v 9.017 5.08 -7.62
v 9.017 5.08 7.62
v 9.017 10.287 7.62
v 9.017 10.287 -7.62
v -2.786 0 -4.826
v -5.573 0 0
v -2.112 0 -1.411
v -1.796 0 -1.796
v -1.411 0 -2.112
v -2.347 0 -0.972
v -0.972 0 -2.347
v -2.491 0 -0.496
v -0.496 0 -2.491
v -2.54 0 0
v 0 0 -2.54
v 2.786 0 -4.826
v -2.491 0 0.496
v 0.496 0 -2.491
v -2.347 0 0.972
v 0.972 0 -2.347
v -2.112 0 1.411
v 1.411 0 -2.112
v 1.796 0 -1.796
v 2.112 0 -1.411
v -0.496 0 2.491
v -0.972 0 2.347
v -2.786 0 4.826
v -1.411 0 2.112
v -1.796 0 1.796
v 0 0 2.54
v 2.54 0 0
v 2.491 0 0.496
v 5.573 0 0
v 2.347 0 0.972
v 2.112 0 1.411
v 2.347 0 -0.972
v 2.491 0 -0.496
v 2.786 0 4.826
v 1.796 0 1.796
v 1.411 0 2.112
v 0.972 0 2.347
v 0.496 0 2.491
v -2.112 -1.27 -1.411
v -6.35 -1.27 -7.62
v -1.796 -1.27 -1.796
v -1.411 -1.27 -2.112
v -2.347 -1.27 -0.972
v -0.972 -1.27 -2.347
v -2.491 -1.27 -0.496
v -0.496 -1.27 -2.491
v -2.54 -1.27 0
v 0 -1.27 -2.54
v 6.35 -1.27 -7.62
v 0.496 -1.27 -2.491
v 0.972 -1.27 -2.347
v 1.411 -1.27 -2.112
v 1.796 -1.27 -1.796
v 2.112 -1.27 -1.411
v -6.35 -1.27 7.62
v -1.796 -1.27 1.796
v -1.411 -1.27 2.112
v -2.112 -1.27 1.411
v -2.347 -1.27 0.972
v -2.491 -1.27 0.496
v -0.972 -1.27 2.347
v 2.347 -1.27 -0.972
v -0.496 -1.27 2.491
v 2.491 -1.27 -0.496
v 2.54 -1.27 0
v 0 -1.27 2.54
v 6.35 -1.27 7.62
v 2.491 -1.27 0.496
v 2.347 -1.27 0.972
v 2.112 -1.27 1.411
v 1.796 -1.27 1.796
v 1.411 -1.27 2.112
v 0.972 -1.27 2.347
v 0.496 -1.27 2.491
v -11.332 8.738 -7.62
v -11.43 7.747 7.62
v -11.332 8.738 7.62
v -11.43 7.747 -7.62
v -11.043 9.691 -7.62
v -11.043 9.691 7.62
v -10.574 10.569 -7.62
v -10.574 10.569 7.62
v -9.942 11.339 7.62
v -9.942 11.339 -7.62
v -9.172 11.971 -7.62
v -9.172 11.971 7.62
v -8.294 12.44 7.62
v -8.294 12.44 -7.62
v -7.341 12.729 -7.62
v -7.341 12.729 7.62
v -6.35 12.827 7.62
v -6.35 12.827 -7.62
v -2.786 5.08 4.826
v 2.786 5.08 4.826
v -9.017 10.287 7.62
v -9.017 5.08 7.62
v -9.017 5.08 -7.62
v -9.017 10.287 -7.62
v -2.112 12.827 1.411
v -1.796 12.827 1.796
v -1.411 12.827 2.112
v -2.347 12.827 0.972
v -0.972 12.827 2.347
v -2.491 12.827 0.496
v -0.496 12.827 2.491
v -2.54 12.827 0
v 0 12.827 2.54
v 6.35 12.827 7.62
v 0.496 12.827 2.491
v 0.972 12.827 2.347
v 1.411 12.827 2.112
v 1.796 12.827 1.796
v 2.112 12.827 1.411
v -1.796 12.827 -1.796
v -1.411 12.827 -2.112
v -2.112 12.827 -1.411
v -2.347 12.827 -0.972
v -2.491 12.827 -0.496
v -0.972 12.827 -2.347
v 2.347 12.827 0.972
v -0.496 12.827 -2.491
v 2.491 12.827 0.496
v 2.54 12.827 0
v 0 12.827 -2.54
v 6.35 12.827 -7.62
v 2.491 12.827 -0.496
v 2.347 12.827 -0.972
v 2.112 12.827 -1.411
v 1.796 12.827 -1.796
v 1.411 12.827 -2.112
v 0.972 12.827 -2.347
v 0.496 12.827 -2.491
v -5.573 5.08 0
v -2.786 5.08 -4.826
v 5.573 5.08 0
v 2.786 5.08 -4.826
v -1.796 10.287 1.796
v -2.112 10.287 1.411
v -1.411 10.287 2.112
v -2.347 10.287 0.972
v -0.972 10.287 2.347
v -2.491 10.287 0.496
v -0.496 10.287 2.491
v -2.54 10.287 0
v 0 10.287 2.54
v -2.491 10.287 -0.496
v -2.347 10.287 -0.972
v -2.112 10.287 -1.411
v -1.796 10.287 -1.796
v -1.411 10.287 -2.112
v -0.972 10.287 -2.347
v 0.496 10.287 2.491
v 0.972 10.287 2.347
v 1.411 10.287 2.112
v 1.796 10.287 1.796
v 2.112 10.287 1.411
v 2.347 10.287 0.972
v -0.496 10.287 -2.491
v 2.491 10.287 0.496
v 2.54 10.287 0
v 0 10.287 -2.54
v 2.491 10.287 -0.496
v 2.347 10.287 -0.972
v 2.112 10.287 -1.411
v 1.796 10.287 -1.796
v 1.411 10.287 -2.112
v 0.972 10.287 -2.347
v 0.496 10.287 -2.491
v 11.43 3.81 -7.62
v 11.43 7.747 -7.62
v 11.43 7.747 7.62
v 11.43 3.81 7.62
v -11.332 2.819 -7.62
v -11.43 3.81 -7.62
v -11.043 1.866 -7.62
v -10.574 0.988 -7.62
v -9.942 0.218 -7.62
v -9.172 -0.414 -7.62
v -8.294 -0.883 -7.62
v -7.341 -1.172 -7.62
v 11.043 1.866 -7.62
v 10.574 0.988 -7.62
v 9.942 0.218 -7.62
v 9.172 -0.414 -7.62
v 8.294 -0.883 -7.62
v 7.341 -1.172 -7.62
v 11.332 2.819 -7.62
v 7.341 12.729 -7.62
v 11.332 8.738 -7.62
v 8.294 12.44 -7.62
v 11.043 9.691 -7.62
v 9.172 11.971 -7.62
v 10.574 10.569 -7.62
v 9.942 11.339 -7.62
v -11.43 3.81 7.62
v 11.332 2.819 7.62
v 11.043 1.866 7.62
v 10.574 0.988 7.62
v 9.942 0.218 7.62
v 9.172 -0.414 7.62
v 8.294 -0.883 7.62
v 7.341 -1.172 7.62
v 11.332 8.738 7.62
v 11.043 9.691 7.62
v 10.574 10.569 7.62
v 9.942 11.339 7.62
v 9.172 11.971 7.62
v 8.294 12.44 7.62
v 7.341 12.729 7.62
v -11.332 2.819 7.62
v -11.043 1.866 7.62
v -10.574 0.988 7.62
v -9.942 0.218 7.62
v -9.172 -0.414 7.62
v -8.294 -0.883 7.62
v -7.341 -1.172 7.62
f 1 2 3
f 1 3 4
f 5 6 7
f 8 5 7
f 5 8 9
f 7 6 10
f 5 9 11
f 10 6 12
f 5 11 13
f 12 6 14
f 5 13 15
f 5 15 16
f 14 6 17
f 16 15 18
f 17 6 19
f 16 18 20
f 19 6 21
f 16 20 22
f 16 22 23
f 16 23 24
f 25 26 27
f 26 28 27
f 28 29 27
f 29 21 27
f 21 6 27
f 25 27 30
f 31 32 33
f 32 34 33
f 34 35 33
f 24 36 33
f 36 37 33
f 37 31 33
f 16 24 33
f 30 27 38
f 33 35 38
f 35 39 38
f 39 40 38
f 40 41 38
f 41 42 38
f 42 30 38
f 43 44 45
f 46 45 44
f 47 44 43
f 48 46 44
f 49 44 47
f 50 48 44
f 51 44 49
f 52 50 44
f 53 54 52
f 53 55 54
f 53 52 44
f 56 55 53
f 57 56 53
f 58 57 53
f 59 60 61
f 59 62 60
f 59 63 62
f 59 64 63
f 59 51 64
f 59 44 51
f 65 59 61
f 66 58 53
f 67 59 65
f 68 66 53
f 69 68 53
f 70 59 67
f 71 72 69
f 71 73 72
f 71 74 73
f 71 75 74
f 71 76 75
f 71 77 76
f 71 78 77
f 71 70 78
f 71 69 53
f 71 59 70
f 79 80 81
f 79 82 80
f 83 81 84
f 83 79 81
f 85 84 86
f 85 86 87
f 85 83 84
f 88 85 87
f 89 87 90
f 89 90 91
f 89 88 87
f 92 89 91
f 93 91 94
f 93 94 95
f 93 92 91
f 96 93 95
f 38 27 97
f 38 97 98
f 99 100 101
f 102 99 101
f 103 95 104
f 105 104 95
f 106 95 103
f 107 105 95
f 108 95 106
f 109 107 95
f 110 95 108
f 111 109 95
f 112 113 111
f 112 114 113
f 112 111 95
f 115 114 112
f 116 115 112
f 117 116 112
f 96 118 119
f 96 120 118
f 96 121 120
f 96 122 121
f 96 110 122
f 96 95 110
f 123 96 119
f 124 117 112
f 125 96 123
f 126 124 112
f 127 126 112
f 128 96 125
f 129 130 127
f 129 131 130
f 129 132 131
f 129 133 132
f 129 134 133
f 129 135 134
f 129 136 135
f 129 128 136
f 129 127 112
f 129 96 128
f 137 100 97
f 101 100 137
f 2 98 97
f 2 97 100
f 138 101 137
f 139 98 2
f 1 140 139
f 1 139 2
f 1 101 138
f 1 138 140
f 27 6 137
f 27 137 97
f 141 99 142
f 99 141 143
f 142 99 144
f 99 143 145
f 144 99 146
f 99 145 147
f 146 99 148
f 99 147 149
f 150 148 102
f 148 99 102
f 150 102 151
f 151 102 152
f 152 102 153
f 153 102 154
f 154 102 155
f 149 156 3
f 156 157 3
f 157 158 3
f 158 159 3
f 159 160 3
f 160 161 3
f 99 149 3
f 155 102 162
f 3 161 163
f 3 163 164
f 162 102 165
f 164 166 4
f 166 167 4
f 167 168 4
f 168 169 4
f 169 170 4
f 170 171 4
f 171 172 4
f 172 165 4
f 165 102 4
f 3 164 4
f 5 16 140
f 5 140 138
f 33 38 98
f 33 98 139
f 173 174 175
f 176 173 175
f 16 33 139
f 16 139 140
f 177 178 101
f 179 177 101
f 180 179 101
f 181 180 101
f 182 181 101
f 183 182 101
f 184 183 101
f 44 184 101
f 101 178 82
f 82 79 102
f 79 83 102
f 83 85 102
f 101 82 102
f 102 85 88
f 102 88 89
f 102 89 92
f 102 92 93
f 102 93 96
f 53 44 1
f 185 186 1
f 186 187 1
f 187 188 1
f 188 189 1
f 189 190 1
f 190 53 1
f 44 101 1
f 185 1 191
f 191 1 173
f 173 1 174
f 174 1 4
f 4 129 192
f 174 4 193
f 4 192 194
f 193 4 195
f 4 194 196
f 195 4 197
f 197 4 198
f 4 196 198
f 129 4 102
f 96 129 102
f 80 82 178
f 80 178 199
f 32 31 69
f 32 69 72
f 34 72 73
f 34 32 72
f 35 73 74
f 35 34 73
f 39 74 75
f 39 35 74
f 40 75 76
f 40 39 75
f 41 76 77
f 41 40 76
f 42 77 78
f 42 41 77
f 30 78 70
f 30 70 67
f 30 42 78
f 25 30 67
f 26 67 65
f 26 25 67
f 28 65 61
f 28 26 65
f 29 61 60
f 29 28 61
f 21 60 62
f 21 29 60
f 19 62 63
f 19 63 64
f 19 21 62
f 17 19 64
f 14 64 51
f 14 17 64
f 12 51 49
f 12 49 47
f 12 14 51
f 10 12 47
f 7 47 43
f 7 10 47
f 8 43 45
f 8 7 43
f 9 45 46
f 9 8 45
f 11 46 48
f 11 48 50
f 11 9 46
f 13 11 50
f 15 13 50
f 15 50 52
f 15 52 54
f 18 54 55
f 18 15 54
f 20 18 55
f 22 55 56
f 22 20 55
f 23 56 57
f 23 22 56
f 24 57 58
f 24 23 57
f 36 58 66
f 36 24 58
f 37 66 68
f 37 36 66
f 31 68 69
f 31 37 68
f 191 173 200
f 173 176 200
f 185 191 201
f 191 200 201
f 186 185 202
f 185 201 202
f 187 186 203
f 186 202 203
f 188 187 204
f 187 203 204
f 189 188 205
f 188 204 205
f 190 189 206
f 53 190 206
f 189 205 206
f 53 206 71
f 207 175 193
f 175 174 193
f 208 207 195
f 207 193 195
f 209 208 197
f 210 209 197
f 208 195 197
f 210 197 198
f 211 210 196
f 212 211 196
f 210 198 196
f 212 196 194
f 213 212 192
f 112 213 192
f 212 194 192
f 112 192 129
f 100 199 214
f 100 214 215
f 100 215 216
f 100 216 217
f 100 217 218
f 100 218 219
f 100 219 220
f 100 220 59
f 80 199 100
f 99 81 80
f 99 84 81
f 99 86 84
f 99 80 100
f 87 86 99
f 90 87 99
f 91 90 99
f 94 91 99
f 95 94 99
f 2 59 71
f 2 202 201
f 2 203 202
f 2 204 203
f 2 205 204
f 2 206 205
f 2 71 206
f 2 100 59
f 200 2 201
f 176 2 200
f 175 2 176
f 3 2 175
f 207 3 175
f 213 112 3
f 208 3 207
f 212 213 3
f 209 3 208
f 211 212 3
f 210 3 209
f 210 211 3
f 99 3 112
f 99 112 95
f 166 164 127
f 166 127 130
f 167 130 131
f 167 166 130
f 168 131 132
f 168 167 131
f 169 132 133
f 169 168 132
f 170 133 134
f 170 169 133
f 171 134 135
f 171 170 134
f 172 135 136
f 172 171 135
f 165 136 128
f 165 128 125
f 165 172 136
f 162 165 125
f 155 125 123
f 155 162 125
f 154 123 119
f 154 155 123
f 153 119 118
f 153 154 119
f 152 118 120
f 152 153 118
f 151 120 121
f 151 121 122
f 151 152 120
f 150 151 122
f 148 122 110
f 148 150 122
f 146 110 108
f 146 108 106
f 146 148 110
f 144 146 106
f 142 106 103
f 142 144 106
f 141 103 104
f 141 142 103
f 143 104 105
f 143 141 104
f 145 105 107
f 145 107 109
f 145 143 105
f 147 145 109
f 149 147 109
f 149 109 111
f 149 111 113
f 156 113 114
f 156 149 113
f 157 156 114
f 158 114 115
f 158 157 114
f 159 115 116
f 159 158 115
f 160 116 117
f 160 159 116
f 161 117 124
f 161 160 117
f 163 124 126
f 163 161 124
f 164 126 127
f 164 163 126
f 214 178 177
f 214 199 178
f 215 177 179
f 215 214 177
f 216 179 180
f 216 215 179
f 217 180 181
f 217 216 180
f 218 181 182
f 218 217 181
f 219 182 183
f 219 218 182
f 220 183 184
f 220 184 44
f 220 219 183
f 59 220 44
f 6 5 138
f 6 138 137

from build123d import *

# Parameters (mm, degrees)
SKETCH1_W           = 22.86
SKETCH1_H           = 15.24
BOSS_EXTRUDE1_DEPTH = 5.08
SKETCH3_W           = 2.413
SKETCH3_H           = 15.24
BOSS_EXTRUDE3_DEPTH = 5.207
SKETCH4_W           = 22.86
SKETCH4_H           = 15.24
SKETCH4_R           = 2.54
BOSS_EXTRUDE4_DEPTH = 2.54
SKETCH5_W           = 22.86
SKETCH5_H           = 15.24
SKETCH5_R           = 2.54
BOSS_EXTRUDE5_DEPTH = 1.27
FILLET1_R           = 5.08


with BuildPart() as part:
    # Sketch1 → Boss-Extrude1 (new body)
    with BuildSketch(Plane(origin=(0, 0, 0), x_dir=(1, 0, 0), z_dir=(0, 1, 0))):
        Rectangle(SKETCH1_W, SKETCH1_H)
        Polygon((5.572584798, 0), (2.786292399, 4.826), (-2.786292399, 4.826), (-5.572584798, 0), (-2.786292399, -4.826), (2.786292399, -4.826), align=None, mode=Mode.SUBTRACT)
    extrude(amount=BOSS_EXTRUDE1_DEPTH)

    # Sketch3 → Boss-Extrude3 (add)
    with BuildSketch(Plane(origin=(0, 5.08, 0), x_dir=(1, 0, 0), z_dir=(0, 1, 0))):
        with Locations((-10.2235, 0)):
            Rectangle(SKETCH3_W, SKETCH3_H)
        with Locations((10.2235, 0)):
            Rectangle(SKETCH3_W, SKETCH3_H)
    extrude(amount=BOSS_EXTRUDE3_DEPTH)

    # Sketch4 → Boss-Extrude4 (add)
    with BuildSketch(Plane(origin=(0, 10.287, 0), x_dir=(1, 0, 0), z_dir=(0, 1, 0))):
        Rectangle(SKETCH4_W, SKETCH4_H)
        Circle(SKETCH4_R, mode=Mode.SUBTRACT)
    extrude(amount=BOSS_EXTRUDE4_DEPTH)

    # Sketch5 → Boss-Extrude5 (add)
    with BuildSketch(Plane.XZ):
        Rectangle(SKETCH5_W, SKETCH5_H)
        Circle(SKETCH5_R, mode=Mode.SUBTRACT)
    extrude(amount=BOSS_EXTRUDE5_DEPTH)

    # Fillet1
    fillet1_edges = [part.edges().sort_by_distance(p)[0] for p in [
        (-11.43, 12.827, 0),
        (11.43, 12.827, 0),
        (-11.43, -1.27, 0),
        (11.43, -1.27, 0),
    ]]
    fillet(fillet1_edges, radius=FILLET1_R)


solid = part.part
